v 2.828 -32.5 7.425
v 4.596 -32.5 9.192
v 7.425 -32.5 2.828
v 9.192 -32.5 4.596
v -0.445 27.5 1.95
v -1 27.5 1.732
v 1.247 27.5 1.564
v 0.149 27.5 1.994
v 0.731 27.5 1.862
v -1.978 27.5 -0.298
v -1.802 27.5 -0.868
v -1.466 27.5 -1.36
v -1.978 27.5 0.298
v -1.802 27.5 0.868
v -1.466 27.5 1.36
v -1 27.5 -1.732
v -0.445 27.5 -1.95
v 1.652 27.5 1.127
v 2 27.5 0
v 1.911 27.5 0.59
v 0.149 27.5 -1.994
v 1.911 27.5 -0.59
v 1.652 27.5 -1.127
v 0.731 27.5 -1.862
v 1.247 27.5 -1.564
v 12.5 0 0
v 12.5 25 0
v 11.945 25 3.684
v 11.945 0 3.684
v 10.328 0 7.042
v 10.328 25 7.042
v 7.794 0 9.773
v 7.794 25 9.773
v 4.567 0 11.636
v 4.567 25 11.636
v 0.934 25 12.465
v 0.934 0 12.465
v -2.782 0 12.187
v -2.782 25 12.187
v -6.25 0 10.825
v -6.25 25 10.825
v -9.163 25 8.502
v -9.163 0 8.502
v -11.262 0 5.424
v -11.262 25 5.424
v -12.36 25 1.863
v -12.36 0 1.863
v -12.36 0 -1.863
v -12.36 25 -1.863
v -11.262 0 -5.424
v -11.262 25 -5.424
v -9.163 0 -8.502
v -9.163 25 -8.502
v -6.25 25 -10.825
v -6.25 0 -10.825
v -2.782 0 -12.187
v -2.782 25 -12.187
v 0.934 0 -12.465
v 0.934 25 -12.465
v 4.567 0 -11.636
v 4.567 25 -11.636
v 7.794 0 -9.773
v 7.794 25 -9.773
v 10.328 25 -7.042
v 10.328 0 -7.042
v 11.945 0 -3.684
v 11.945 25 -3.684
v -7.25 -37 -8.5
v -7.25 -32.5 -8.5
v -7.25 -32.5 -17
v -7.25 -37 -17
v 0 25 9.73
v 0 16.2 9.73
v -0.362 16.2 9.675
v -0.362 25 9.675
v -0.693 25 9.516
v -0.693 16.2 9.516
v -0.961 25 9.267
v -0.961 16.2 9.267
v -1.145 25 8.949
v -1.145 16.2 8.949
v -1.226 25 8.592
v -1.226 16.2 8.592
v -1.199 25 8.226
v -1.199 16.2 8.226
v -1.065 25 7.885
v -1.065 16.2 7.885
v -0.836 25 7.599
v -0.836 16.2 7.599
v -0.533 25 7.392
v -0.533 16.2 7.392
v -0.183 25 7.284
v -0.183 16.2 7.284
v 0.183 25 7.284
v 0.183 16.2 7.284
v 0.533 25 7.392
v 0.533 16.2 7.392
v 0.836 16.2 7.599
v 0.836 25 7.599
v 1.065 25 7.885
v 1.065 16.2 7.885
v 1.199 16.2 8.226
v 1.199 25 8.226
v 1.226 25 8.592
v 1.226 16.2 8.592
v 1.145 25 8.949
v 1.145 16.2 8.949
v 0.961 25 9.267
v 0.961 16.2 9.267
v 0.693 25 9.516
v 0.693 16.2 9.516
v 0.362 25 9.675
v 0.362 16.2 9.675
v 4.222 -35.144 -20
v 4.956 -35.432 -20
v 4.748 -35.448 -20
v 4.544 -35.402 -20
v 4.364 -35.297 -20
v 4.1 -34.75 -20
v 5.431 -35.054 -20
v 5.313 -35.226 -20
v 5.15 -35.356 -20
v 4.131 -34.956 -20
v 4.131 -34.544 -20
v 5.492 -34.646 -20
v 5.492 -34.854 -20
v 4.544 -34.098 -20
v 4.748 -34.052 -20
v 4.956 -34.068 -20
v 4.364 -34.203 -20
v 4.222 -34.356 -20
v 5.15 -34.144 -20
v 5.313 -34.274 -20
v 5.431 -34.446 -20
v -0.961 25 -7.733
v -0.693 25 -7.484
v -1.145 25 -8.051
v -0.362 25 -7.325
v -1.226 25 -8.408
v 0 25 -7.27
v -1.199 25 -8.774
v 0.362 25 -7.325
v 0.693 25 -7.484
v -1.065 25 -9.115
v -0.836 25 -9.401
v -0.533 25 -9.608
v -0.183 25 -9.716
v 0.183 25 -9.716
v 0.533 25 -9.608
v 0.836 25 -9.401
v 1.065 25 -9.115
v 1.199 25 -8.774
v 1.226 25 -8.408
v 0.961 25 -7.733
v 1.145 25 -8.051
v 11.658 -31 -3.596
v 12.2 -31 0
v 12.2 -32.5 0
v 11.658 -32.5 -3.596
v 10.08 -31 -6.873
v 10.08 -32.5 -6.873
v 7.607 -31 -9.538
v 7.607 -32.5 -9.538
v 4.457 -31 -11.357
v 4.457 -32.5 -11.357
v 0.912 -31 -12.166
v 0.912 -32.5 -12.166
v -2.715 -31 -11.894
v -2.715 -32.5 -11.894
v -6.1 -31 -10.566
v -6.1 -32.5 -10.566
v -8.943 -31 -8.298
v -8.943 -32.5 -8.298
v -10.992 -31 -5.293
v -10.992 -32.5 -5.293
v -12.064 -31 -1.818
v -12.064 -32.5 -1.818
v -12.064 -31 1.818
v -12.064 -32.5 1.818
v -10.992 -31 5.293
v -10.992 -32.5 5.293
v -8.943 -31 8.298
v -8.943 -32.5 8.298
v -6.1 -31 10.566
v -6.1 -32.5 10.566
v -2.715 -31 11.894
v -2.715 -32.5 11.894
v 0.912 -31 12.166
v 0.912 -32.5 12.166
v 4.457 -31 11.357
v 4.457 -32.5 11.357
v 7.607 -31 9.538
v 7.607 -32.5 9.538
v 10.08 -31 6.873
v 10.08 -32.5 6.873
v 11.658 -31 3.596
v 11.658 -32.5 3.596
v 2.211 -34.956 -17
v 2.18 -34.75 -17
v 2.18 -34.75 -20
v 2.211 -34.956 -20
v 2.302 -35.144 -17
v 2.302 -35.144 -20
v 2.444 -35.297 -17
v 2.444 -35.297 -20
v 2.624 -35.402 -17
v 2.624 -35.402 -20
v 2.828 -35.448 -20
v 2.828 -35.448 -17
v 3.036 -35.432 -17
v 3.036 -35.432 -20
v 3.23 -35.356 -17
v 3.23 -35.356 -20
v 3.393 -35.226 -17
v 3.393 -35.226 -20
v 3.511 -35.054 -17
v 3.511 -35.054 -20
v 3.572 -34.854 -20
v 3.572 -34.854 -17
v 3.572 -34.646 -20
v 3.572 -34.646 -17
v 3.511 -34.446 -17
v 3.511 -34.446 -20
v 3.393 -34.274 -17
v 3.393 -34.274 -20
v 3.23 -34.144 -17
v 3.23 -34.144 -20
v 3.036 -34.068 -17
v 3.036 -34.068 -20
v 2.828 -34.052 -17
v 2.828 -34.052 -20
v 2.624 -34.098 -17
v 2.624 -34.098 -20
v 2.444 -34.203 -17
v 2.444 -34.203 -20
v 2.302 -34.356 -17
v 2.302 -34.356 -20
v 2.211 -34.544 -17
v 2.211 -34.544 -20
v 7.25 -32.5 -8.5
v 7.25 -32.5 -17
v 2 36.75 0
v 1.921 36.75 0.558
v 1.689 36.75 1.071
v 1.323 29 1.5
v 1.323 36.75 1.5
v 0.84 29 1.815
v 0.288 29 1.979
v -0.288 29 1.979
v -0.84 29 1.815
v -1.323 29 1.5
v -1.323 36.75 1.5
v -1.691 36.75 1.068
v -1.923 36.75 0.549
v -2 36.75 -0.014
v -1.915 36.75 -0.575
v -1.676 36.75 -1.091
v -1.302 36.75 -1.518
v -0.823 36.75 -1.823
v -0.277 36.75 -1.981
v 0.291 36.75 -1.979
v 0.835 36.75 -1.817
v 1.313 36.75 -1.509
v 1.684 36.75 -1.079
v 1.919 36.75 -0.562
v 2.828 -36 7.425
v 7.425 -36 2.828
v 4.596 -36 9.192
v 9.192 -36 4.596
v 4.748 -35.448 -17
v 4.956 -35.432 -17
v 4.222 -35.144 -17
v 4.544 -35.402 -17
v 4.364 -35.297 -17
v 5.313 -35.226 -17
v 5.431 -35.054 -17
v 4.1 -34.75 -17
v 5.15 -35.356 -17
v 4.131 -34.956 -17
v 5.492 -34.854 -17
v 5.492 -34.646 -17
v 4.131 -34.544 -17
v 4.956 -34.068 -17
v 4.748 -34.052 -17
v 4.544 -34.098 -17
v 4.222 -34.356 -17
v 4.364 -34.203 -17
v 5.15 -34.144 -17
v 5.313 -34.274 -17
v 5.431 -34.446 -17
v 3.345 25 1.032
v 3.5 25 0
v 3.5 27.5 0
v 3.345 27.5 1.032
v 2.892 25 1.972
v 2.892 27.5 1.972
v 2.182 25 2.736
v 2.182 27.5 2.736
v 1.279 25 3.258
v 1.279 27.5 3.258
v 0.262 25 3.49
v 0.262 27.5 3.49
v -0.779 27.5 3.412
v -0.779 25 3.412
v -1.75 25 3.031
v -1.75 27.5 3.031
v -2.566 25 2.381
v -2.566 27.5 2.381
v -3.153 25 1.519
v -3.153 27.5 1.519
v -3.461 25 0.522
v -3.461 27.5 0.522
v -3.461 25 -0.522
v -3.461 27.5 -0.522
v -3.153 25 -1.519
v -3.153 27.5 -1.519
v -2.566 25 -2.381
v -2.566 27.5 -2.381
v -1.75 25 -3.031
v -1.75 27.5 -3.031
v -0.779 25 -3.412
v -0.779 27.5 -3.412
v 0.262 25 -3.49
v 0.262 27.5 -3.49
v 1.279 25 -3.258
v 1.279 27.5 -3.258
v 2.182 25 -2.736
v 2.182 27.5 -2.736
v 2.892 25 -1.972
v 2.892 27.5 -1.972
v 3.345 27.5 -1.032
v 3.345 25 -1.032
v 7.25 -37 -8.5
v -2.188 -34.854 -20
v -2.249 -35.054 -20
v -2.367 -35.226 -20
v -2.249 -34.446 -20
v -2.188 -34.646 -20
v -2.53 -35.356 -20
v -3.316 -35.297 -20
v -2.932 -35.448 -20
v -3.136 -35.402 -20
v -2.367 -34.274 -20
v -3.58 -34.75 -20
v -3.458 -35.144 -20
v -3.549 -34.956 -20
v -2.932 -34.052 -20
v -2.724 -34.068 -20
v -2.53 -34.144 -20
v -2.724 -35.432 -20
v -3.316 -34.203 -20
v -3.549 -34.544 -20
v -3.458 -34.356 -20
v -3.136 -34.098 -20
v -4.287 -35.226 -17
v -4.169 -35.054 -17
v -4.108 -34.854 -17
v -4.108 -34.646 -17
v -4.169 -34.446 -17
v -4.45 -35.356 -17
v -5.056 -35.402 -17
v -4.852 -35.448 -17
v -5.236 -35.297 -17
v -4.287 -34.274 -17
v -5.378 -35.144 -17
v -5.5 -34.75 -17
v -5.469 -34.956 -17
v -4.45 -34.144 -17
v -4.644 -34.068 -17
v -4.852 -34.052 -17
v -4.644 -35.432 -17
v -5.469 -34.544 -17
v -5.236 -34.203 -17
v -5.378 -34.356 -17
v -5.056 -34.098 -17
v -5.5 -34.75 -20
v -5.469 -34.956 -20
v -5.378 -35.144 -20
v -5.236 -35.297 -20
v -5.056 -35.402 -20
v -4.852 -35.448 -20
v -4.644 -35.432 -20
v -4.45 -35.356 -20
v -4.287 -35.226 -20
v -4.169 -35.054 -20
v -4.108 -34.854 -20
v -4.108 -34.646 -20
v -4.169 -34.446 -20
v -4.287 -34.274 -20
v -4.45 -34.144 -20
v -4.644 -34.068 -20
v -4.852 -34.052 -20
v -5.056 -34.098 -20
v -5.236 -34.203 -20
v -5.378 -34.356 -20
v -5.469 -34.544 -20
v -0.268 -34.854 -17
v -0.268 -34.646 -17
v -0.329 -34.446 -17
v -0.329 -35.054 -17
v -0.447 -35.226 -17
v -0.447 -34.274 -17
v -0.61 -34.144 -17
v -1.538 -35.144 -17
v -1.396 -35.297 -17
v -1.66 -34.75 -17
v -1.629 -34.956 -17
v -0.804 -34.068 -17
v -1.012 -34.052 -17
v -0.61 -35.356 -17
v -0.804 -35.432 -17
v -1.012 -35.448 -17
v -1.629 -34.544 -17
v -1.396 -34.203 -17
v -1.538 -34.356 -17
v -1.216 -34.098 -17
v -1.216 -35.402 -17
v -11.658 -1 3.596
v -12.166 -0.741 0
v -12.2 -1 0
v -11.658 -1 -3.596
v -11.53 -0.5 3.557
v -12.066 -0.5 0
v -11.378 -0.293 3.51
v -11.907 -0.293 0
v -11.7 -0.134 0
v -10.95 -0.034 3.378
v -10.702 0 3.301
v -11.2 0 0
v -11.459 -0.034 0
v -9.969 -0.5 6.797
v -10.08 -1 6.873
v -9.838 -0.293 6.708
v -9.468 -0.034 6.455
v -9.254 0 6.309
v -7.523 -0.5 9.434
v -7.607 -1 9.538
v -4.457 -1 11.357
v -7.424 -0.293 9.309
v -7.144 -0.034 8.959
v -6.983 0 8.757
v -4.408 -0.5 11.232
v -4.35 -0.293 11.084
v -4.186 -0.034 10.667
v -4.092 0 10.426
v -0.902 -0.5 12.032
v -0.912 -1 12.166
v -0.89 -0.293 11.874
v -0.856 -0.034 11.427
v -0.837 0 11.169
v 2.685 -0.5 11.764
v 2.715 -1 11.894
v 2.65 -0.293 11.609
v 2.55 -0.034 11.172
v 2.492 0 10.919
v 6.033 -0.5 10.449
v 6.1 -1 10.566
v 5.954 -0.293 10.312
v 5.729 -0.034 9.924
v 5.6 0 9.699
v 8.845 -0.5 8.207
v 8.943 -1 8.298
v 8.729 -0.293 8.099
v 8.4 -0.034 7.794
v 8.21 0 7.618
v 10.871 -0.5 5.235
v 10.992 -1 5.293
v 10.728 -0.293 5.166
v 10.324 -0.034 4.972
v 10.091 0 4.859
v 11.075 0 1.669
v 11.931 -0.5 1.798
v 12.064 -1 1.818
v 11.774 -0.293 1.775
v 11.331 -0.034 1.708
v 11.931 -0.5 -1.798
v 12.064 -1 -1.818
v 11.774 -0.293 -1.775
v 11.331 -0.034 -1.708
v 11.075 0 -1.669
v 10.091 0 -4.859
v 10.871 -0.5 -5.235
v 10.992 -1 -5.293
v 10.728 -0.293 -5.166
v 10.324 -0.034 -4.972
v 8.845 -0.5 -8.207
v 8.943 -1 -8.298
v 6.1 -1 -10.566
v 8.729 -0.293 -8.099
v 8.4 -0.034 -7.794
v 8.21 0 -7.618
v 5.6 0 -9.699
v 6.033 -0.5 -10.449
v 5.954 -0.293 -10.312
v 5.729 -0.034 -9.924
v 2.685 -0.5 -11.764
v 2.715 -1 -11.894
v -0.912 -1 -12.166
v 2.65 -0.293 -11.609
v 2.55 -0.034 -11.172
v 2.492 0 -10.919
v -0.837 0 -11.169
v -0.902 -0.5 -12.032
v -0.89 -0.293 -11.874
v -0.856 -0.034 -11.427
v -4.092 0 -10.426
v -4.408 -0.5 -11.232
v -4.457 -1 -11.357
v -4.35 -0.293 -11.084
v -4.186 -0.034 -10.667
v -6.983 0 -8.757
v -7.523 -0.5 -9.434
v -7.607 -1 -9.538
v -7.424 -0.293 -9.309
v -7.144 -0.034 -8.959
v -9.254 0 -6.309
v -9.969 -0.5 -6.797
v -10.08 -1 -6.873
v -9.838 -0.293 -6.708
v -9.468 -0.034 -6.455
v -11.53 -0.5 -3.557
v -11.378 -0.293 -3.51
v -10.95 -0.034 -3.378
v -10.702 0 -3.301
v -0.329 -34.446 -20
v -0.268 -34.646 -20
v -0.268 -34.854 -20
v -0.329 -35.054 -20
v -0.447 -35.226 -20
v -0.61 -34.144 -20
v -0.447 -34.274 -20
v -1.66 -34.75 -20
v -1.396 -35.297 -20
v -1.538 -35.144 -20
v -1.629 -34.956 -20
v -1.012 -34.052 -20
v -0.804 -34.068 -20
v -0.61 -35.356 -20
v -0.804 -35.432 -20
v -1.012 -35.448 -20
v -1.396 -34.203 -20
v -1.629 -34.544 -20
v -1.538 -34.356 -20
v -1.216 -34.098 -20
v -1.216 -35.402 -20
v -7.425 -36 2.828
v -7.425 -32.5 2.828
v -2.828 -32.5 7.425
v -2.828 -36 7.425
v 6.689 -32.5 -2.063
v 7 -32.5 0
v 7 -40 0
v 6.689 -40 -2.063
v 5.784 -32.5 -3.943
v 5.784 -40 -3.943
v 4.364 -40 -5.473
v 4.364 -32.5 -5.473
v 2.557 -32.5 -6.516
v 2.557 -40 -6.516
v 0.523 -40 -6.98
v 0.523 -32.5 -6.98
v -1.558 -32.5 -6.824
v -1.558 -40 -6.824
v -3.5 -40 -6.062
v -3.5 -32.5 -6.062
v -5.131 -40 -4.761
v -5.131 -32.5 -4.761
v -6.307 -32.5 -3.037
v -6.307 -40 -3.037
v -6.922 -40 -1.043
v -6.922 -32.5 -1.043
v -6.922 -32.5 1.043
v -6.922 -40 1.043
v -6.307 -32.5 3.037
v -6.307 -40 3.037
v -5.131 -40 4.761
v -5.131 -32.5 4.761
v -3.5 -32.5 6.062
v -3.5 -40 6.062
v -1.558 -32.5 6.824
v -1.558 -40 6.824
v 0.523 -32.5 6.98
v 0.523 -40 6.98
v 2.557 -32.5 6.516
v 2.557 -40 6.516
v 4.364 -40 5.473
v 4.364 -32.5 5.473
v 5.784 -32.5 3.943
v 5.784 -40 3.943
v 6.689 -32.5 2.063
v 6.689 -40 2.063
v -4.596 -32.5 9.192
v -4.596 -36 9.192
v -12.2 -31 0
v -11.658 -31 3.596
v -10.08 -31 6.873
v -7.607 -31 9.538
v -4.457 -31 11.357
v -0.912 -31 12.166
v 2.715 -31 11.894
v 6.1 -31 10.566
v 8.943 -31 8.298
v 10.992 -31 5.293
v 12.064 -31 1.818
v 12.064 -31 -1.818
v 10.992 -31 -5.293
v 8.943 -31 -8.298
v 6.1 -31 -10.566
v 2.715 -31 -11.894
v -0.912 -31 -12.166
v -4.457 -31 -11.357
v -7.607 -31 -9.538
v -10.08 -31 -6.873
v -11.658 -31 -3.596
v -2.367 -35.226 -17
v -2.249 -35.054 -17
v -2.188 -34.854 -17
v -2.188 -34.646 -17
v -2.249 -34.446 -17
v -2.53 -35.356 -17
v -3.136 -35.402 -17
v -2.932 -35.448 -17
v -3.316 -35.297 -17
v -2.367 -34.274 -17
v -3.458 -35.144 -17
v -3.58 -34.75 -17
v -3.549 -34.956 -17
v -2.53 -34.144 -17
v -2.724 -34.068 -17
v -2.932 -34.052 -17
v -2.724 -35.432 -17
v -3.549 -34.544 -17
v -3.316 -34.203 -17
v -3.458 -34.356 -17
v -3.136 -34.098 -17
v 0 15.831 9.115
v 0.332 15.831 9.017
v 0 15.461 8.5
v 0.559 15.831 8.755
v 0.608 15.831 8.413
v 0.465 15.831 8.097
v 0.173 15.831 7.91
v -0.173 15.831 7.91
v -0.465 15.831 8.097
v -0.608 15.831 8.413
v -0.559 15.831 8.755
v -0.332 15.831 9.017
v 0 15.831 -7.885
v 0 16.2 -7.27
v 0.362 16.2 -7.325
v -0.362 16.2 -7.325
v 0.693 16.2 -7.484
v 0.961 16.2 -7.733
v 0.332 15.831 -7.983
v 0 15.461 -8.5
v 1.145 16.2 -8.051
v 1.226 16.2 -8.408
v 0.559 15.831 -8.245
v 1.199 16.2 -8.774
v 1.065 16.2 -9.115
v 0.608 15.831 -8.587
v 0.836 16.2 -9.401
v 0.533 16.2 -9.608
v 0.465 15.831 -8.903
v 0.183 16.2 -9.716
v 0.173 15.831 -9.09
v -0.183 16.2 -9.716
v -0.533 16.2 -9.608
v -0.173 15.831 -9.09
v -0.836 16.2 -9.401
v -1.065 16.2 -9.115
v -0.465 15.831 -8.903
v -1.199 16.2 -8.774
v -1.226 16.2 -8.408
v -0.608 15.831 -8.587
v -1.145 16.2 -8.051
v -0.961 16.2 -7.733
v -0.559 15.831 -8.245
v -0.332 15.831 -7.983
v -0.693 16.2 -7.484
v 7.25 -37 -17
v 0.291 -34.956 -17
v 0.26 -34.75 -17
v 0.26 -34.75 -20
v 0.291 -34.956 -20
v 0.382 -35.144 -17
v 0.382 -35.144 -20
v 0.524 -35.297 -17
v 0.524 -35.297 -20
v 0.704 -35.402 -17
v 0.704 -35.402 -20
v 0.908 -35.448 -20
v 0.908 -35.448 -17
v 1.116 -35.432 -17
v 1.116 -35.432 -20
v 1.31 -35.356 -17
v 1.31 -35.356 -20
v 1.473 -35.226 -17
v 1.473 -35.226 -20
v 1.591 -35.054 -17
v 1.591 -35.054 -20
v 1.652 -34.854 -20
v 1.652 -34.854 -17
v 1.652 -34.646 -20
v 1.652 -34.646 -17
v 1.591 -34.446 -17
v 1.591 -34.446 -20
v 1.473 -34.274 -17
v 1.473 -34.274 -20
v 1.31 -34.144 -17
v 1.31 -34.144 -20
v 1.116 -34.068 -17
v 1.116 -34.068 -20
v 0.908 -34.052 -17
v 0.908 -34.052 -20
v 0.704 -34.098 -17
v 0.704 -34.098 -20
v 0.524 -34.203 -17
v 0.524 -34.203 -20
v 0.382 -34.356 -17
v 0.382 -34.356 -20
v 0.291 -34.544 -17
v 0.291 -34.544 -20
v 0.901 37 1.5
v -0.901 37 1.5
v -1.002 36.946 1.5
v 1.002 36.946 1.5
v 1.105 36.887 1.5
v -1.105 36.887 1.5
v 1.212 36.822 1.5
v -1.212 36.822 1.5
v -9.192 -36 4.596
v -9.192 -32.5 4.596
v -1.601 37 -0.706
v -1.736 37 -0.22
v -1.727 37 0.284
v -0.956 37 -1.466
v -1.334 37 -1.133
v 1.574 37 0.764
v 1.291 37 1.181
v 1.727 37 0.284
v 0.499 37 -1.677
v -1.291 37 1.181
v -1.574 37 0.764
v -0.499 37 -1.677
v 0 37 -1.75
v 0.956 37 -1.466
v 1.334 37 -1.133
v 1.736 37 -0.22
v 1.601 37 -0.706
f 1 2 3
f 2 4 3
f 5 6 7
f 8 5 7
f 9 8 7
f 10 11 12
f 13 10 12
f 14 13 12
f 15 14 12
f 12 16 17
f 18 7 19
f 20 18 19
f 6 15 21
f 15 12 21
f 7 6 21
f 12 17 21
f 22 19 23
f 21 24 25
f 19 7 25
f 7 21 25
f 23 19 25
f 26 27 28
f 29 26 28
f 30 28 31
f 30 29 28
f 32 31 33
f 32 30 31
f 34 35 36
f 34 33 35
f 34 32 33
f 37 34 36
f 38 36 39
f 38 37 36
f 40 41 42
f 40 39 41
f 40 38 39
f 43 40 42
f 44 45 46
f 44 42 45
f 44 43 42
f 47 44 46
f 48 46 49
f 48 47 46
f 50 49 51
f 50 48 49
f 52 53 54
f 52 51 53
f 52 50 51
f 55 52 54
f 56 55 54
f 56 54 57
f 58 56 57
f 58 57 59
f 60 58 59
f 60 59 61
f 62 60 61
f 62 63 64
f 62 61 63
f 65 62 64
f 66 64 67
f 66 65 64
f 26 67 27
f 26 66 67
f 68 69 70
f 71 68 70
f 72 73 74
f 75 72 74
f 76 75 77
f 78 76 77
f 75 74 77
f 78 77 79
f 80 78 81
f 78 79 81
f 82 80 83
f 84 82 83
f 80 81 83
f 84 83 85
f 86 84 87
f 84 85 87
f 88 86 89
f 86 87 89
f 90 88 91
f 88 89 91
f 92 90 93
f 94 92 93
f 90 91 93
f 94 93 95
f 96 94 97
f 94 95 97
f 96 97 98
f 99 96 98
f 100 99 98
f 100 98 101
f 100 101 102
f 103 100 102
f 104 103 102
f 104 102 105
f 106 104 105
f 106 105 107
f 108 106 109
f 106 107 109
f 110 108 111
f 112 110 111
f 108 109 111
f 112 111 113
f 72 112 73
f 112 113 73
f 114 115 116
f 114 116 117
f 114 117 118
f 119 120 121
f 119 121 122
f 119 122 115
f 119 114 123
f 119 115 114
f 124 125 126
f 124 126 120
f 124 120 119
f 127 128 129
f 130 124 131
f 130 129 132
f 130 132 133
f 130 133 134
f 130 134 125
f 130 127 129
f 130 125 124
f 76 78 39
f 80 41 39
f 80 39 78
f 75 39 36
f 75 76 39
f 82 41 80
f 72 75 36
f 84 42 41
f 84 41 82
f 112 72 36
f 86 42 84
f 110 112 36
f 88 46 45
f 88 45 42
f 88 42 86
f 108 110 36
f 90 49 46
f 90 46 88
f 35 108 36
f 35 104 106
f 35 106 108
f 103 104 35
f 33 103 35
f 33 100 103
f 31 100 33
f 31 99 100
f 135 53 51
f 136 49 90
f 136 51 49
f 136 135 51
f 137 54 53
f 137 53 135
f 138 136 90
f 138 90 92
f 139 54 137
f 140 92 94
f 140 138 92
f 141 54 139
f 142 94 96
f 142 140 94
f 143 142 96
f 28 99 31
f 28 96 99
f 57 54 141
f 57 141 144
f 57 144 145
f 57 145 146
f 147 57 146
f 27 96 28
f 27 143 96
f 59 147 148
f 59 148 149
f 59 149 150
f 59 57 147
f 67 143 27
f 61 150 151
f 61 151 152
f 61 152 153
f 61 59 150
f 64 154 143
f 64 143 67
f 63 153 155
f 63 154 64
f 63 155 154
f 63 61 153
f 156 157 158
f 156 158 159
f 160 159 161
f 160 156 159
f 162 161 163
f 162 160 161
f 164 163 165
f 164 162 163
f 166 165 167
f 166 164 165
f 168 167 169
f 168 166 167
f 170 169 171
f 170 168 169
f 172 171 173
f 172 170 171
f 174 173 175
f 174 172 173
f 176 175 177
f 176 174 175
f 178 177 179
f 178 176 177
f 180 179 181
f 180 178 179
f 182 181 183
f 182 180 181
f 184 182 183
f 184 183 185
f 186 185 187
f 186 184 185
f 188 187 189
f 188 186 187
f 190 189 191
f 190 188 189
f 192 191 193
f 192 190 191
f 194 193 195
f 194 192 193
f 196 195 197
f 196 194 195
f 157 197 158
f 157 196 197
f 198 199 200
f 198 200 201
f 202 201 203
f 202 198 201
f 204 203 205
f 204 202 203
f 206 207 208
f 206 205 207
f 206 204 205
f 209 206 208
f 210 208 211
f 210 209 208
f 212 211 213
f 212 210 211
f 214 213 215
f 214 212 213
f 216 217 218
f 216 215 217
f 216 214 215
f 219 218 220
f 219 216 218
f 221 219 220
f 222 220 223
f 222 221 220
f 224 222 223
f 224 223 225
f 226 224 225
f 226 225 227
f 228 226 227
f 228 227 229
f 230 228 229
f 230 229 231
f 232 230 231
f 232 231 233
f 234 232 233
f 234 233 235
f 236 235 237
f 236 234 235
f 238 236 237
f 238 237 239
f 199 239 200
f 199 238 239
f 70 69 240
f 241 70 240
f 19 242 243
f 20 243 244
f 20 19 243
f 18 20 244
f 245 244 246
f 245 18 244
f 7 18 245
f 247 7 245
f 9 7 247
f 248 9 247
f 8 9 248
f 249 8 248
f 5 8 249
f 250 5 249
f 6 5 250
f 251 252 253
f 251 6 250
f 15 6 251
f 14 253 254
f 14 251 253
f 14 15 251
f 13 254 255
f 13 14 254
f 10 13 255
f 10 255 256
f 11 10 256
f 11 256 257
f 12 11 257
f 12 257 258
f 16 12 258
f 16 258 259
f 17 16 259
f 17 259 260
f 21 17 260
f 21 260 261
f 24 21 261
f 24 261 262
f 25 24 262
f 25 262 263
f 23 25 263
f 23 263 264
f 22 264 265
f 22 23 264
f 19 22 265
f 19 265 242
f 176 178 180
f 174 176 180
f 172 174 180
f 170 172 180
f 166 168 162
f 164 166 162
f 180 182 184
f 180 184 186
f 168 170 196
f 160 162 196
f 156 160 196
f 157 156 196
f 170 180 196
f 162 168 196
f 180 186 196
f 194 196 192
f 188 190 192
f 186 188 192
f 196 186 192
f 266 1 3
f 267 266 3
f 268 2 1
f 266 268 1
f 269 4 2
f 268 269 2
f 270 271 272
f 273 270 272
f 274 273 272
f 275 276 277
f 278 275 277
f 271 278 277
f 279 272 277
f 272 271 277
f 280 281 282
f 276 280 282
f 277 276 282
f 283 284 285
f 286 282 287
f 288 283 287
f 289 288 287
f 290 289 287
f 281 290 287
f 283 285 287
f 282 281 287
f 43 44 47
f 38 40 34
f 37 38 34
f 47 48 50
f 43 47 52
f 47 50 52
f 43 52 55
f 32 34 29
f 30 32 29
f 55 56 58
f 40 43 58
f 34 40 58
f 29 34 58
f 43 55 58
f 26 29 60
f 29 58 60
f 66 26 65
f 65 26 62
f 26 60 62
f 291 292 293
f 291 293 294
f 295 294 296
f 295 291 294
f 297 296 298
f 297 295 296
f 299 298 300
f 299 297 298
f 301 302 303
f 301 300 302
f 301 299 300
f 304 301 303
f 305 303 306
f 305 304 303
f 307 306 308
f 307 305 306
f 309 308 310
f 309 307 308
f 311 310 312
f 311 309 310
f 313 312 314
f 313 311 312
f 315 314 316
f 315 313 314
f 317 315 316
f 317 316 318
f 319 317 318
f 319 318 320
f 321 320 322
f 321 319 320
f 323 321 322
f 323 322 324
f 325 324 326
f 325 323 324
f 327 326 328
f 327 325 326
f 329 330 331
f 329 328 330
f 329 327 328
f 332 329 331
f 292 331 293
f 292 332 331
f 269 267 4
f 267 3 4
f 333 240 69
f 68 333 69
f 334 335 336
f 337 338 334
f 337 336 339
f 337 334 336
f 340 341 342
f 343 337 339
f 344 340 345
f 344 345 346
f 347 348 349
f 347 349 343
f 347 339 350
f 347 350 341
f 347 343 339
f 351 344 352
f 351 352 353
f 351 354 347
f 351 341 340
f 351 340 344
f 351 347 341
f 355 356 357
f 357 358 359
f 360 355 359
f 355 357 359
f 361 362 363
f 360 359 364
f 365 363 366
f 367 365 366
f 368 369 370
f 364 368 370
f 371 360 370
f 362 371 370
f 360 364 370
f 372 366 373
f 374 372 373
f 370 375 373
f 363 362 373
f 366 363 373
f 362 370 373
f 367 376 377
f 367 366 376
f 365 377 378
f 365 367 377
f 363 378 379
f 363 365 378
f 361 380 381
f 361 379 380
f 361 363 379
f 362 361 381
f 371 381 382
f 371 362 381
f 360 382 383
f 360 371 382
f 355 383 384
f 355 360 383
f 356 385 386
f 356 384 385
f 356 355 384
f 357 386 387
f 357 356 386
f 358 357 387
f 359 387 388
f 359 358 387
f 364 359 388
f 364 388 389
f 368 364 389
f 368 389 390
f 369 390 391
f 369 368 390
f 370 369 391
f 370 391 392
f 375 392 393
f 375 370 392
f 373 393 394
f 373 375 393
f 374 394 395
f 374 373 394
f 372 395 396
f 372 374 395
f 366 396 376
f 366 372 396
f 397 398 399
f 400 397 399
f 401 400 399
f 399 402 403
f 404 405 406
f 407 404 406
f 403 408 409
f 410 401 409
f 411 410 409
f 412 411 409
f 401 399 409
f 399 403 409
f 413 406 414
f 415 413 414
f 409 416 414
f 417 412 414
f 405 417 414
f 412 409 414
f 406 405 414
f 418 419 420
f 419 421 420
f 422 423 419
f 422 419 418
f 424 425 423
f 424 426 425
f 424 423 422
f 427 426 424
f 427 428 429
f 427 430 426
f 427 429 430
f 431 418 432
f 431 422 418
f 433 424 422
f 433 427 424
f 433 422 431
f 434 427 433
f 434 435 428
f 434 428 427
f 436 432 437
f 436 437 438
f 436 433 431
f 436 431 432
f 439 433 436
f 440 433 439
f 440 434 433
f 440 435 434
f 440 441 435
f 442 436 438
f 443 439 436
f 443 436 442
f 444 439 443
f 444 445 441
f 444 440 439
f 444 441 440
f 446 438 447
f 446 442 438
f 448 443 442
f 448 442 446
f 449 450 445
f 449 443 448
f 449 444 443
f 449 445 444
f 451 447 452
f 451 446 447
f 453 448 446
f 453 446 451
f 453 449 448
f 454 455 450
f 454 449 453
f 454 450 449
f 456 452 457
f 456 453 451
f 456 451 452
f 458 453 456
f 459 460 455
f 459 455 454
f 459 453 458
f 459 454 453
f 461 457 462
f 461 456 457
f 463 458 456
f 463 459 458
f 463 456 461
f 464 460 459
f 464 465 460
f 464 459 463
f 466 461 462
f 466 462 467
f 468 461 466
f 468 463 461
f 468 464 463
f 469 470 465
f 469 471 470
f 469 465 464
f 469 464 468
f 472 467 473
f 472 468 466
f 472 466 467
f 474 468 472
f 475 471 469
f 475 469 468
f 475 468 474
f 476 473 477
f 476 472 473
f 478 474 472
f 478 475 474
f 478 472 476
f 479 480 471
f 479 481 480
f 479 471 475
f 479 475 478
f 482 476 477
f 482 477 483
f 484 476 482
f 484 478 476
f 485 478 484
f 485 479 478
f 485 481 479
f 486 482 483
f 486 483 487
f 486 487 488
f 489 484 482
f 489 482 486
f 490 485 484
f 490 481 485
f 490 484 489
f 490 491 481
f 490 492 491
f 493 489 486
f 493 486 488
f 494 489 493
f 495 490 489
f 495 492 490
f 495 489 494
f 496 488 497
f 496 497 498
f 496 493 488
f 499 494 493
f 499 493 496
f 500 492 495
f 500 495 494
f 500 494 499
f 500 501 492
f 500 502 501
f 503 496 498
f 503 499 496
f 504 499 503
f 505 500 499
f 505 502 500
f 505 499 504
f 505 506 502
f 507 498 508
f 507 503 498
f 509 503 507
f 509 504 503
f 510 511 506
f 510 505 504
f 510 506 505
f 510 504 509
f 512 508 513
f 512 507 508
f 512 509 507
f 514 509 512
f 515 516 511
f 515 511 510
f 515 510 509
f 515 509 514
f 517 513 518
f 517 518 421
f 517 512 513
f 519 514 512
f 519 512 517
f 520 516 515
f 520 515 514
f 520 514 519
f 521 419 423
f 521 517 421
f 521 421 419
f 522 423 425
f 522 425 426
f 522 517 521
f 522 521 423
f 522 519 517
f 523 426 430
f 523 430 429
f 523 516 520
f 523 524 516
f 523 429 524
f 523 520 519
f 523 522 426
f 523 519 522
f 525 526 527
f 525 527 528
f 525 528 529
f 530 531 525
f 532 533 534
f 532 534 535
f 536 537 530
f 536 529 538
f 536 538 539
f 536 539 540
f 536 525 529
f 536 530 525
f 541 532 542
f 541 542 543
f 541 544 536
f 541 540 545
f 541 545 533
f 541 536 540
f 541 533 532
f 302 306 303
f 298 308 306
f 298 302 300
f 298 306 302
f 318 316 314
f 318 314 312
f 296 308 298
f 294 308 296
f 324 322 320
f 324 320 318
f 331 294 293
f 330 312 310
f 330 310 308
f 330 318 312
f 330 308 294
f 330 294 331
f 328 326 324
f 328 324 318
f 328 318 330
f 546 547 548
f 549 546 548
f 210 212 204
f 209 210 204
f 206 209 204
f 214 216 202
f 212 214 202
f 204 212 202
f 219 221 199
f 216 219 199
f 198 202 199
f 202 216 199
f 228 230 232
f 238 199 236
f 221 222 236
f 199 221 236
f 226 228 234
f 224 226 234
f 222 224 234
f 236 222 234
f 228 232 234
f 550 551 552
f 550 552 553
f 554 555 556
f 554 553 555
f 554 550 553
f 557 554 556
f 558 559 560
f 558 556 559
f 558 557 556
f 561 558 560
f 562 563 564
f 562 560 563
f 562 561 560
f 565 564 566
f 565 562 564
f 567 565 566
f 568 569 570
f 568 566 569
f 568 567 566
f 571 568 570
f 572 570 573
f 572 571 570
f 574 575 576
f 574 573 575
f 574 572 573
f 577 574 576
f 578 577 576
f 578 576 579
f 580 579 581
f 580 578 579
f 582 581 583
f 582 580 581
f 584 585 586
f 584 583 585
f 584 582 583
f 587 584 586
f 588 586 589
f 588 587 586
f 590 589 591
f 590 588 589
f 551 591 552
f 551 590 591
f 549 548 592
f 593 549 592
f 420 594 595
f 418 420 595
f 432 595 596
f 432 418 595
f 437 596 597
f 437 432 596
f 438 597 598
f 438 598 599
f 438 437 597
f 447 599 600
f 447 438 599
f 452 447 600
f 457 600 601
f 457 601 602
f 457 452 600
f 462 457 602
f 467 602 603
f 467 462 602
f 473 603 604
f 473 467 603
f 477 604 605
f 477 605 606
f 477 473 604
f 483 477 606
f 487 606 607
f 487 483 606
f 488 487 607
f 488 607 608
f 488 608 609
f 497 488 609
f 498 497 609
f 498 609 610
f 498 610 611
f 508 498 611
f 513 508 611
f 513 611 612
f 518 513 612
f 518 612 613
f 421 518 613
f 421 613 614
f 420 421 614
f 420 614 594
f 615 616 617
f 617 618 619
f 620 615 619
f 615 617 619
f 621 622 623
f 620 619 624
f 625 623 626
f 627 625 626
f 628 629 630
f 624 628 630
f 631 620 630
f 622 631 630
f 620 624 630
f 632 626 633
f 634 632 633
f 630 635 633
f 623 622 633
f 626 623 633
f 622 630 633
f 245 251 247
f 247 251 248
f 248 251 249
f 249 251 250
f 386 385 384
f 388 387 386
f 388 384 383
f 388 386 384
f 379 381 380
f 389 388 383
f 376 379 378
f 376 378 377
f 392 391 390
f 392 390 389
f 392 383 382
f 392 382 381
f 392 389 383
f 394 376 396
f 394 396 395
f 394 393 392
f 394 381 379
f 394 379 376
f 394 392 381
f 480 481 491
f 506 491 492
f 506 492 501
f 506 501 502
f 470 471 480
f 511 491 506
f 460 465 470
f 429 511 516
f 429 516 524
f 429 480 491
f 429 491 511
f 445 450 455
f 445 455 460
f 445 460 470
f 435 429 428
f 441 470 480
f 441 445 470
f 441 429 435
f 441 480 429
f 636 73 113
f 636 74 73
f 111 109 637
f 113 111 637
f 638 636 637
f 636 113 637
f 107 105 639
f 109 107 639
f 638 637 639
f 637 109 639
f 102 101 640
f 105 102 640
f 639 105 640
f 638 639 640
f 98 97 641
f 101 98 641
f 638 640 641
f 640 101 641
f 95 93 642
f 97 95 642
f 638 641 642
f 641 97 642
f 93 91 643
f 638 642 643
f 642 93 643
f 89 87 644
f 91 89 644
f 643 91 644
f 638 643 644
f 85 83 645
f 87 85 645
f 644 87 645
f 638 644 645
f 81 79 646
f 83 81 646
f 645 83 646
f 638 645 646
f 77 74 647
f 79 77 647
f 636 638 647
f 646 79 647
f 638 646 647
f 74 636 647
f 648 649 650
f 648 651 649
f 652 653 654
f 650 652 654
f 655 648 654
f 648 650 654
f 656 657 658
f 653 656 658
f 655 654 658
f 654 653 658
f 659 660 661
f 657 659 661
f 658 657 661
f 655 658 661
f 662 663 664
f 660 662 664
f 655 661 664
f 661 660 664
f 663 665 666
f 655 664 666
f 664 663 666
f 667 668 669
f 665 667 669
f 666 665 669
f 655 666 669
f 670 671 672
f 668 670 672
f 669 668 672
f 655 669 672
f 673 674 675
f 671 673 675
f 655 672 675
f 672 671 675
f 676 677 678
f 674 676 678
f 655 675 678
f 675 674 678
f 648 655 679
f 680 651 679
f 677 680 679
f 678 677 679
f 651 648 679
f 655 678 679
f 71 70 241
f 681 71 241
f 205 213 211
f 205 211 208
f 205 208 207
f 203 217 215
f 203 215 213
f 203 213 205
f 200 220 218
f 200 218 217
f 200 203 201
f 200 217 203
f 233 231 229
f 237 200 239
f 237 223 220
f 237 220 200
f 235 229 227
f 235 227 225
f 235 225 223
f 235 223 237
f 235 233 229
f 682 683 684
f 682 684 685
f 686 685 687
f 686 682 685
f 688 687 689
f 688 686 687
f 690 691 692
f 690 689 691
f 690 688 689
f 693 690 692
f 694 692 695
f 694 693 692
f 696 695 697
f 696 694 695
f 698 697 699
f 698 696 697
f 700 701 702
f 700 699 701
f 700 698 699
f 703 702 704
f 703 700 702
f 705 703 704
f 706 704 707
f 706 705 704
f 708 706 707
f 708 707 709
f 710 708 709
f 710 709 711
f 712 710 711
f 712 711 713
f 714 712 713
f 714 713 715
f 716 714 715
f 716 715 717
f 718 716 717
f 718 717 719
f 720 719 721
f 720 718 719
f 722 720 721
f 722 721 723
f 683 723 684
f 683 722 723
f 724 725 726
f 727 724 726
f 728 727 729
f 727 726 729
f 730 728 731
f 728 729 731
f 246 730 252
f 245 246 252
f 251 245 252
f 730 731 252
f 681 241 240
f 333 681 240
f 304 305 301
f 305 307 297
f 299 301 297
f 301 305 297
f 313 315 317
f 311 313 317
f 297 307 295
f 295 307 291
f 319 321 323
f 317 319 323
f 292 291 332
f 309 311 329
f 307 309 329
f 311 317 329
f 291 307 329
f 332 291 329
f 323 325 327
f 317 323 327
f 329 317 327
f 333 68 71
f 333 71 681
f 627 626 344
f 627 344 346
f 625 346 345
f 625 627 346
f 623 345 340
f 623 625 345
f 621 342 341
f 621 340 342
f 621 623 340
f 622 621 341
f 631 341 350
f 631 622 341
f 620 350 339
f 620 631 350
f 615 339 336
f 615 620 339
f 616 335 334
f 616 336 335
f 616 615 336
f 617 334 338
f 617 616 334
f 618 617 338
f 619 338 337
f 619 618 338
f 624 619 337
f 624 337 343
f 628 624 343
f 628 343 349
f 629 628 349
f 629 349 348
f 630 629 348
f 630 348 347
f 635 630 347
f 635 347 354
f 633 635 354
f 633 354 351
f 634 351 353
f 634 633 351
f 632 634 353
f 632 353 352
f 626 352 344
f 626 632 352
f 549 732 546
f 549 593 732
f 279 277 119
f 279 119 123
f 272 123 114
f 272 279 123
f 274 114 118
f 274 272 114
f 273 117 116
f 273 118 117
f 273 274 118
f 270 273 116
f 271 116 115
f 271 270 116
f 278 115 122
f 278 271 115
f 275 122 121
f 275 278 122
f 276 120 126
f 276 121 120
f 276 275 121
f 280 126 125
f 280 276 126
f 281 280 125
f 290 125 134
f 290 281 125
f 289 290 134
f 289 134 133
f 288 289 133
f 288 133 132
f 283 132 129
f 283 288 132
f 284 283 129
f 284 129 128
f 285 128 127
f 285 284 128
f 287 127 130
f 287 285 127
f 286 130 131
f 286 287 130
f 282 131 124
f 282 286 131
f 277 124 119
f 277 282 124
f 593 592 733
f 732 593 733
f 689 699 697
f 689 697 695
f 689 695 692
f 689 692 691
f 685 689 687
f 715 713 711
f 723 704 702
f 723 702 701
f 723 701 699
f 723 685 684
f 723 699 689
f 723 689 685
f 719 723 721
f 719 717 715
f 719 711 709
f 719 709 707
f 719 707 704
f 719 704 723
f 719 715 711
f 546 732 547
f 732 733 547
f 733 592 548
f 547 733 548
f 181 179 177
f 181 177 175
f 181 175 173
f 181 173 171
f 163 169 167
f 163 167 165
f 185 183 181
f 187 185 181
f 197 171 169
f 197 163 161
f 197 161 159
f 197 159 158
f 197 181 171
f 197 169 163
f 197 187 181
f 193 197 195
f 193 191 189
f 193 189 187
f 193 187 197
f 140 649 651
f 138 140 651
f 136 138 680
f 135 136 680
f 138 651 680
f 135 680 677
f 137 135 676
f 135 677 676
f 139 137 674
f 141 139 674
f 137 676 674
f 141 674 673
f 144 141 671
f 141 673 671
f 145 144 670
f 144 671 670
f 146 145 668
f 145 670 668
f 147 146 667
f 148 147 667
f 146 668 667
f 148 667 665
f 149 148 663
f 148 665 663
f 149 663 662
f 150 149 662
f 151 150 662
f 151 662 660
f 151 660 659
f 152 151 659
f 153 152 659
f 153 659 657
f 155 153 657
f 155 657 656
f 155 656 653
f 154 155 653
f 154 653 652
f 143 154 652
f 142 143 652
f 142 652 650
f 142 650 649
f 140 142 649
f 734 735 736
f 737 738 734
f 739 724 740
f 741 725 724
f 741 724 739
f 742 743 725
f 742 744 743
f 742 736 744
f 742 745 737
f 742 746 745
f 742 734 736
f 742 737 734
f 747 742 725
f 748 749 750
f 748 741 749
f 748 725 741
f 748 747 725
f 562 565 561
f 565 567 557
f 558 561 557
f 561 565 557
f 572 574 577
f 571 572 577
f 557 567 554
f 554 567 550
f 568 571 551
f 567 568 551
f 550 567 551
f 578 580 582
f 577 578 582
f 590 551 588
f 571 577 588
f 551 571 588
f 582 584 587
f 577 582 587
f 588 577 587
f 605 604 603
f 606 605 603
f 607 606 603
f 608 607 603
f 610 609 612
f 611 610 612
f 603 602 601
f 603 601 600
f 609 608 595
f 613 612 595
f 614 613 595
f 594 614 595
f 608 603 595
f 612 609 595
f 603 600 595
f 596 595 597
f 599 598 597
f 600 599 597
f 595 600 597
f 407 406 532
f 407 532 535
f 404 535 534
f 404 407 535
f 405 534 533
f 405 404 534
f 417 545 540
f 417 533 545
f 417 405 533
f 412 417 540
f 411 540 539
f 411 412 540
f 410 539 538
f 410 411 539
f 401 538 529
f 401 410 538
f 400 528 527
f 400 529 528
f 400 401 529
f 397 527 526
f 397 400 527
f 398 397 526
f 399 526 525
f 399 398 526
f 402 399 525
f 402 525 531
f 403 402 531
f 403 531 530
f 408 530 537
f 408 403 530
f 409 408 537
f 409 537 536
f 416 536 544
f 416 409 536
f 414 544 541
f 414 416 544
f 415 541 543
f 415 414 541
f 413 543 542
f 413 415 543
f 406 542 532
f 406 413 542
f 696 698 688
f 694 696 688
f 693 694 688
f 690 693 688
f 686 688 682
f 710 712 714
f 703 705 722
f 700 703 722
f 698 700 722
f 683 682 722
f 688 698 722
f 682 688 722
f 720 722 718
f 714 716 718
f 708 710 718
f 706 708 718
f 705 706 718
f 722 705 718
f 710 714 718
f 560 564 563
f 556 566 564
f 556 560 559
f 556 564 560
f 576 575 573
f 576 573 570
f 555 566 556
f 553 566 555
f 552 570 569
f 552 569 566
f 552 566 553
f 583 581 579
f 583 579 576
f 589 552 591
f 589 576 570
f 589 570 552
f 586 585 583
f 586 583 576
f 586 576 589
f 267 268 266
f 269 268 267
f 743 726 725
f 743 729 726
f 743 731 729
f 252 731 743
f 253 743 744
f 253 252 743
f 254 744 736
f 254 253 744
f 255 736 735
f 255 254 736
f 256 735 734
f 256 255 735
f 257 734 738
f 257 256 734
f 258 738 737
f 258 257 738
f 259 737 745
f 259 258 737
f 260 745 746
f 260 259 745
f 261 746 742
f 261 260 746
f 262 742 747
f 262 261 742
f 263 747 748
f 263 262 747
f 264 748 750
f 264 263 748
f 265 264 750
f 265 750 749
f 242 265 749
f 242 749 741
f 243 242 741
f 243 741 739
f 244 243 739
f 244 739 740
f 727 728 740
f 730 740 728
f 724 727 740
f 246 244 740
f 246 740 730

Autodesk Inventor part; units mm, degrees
ref_plane "YZ Plane" through (0, 0, 0) normal (1, 0, 0) x (0, 1, 0)
ref_plane "XZ Plane" through (0, 0, 0) normal (0, 1, 0) x (-1, 0, 0)
ref_plane "XY Plane" through (0, 0, 0) normal (0, 0, 1) x (1, 0, 0)
sketch "Sketch1" plane through (0, 0, 0) normal (0, 1, 0) x (-1, 0, 0)
  circle A0 centre (0, 0) radius 12.2
  dimension "d0" = 24.4
extrude "Extrusion1" add sketch "Sketch1" against normal blind 31
fillet "Fillet1" radius 1 1 edges at (12.2, 0, 0)
sketch "Sketch2" plane through (0, -31, 0) normal (0, -1, 0) x (1, 0, 0)
  circle A0 centre (0, 0) radius 12.2 projected
extrude "Extrusion2" add sketch "Sketch2" along normal blind 1.5 separate body
sketch "Sketch3" plane through (0, -32.5, 0) normal (0, -1, 0) x (1, 0, 0)
  circle A0 centre (0, 0) radius 7
  dimension "d6" = 14
extrude "Extrusion3" add sketch "Sketch3" along normal blind 7.5 separate body
sketch "Sketch4" plane through (0, -32.5, 0) normal (0, -1, 0) x (1, 0, 0)
  circle A0 centre (0, 0) radius 6.75 construction
  line L0 (-7.4246, 2.8284) -> (-2.8284, 7.4246)
  line L1 (-2.8284, 7.4246) -> (-4.5962, 9.1924)
  line L2 (-4.5962, 9.1924) -> (-9.1924, 4.5962)
  line L3 (-9.1924, 4.5962) -> (-7.4246, 2.8284)
  line L4 (-7.4246, 2.8284) -> (-4.5962, 9.1924) construction
  line L5 (-2.8284, 7.4246) -> (-9.1924, 4.5962) construction
  line L6 (0, 0) -> (-6.0104, 6.0104) construction
  line L7 (0, 0) -> (-12.2, 0) construction
  circle A1 centre (0, 0) radius 12.2 construction
  point P0 (4.773, -4.773)
  dimension "d9" = 13.5
  dimension "d10" = 6.5
  dimension "d11" = 2.5
  dimension "d12" = 45
  dimension "d13" = 16.5
extrude "Extrusion4" add sketch "Sketch4" along normal blind 3.5 separate body
pattern_circular "Circular Pattern1" count 2 over 90 about axis through (0, -32.5, 0) along (0, 1, 0) of "Extrusion4" bodies 4
sketch "Sketch5" plane through (0, -32.5, 0) normal (0, -1, 0) x (1, 0, 0)
  line L0 (-7.25, -17) -> (7.25, -17)
  line L1 (7.25, -17) -> (7.25, -8.5)
  line L2 (7.25, -8.5) -> (-7.25, -8.5)
  line L3 (-7.25, -8.5) -> (-7.25, -17)
  line L4 (-7.25, -17) -> (7.25, -8.5) construction
  line L5 (7.25, -17) -> (-7.25, -8.5) construction
  circle A0 centre (0, 0) radius 7 projected
  point P0 (0, -12.75)
  point P1 (0, -12.75)
  dimension "d19" = 17
  dimension "d20" = 8.5
  dimension "d21" = 14.5
extrude "Extrusion5" add sketch "Sketch5" along normal blind 4.5 separate body contours L3 L2 L1 L0
sketch "Sketch6" plane through (7.25, -32.5, -17) normal (0, 0, -1) x (-1, 0, 0)
  line L0 (12.05, -2.25) -> (10.13, -2.25) construction
  line L1 (10.13, -2.25) -> (8.21, -2.25) construction
  line L2 (8.21, -2.25) -> (6.29, -2.25) construction
  line L3 (6.29, -2.25) -> (4.37, -2.25) construction
  line L4 (4.37, -2.25) -> (2.45, -2.25) construction
  circle A0 centre (12.05, -2.25) radius 0.7
  circle A1 centre (10.13, -2.25) radius 0.7
  circle A2 centre (8.21, -2.25) radius 0.7
  circle A3 centre (6.29, -2.25) radius 0.7
  circle A4 centre (4.37, -2.25) radius 0.7
  circle A5 centre (2.45, -2.25) radius 0.7
  line L5 (14.5, 0) -> (14.5, -4.5) projected
  line L6 (14.5, -4.5) -> (0, -4.5) projected
  point P0 (7.25, 32.5)
  point P1 (14.5, -2.25)
  point P2 (7.25, -2.25)
  point P3 (7.25, -4.5)
  dimension "d24" = 9.6
  dimension "d25" = 1.4
extrude "Extrusion6" add sketch "Sketch6" along normal blind 3 separate body contours A0
extrude "Extrusion7" add sketch "Sketch6" along normal blind 3 separate body contours A1
extrude "Extrusion8" add sketch "Sketch6" along normal blind 3 separate body contours A2
extrude "Extrusion9" add sketch "Sketch6" along normal blind 3 separate body contours A3
extrude "Extrusion10" add sketch "Sketch6" along normal blind 3 separate body contours A4
extrude "Extrusion11" add sketch "Sketch6" along normal blind 3 separate body contours A5
sketch "Sketch7" plane through (0, 0, 0) normal (0, 1, 0) x (1, 0, 0)
  circle A0 centre (0, 0) radius 12.5
  dimension "d38" = 25
extrude "Extrusion12" add sketch "Sketch7" along normal blind 25 separate body
sketch "Sketch8" plane through (0, 25, 0) normal (0, 1, 0) x (1, 0, 0)
  circle A0 centre (0, 0) radius 11.2 construction
  circle A1 centre (0, 0) radius 3.5
  dimension "d41" = 7
extrude "Extrusion13" add sketch "Sketch8" along normal blind 2.5 separate body
sketch "Sketch9" plane through (0, 27.5, 0) normal (0, 1, 0) x (1, 0, 0)
  circle A0 centre (0, 0) radius 2
  dimension "d44" = 4
extrude "Extrusion14" add sketch "Sketch9" along normal blind 9.5 separate body
chamfer "Chamfer1" distance 0.25 angle 45 1 edges at (-2, 37, 0)
sketch "Sketch10" plane through (0, 37, 0) normal (0, 1, 0) x (1, 0, 0)
  line L0 (-1.3229, -2) -> (1.3229, -2)
  line L1 (1.3229, -2) -> (1.3229, -1.5)
  line L2 (1.3229, -1.5) -> (-1.3229, -1.5)
  line L3 (-1.3229, -1.5) -> (-1.3229, -2)
  circle A0 centre (0, 0) radius 2 construction
  dimension "d50" = 1.5
extrude "Extrusion15" cut sketch "Sketch10" against normal blind 8 bodies 14
sketch "Sketch11" plane through (0, 25, 0) normal (0, 1, 0) x (1, 0, 0)
  circle A0 centre (0, 0) radius 12.5 construction
  line L0 (0, 8.5) -> (0, -8.5) construction
  line L1 (7.25, 8.5) -> (-7.25, 8.5) construction
  dimension "d53" = 17
hole "Hole1" at (0, 25, -8.5) at (0, 25, 8.5) direction (0, -1, 0) diameter 2.459 depth 8.8 tip angle 118 bodies 12 thread size "M3x0.5" class "6H" standard "ISO Metric profile"
properties part number "JGA25-371_12VDC_32RPM"
